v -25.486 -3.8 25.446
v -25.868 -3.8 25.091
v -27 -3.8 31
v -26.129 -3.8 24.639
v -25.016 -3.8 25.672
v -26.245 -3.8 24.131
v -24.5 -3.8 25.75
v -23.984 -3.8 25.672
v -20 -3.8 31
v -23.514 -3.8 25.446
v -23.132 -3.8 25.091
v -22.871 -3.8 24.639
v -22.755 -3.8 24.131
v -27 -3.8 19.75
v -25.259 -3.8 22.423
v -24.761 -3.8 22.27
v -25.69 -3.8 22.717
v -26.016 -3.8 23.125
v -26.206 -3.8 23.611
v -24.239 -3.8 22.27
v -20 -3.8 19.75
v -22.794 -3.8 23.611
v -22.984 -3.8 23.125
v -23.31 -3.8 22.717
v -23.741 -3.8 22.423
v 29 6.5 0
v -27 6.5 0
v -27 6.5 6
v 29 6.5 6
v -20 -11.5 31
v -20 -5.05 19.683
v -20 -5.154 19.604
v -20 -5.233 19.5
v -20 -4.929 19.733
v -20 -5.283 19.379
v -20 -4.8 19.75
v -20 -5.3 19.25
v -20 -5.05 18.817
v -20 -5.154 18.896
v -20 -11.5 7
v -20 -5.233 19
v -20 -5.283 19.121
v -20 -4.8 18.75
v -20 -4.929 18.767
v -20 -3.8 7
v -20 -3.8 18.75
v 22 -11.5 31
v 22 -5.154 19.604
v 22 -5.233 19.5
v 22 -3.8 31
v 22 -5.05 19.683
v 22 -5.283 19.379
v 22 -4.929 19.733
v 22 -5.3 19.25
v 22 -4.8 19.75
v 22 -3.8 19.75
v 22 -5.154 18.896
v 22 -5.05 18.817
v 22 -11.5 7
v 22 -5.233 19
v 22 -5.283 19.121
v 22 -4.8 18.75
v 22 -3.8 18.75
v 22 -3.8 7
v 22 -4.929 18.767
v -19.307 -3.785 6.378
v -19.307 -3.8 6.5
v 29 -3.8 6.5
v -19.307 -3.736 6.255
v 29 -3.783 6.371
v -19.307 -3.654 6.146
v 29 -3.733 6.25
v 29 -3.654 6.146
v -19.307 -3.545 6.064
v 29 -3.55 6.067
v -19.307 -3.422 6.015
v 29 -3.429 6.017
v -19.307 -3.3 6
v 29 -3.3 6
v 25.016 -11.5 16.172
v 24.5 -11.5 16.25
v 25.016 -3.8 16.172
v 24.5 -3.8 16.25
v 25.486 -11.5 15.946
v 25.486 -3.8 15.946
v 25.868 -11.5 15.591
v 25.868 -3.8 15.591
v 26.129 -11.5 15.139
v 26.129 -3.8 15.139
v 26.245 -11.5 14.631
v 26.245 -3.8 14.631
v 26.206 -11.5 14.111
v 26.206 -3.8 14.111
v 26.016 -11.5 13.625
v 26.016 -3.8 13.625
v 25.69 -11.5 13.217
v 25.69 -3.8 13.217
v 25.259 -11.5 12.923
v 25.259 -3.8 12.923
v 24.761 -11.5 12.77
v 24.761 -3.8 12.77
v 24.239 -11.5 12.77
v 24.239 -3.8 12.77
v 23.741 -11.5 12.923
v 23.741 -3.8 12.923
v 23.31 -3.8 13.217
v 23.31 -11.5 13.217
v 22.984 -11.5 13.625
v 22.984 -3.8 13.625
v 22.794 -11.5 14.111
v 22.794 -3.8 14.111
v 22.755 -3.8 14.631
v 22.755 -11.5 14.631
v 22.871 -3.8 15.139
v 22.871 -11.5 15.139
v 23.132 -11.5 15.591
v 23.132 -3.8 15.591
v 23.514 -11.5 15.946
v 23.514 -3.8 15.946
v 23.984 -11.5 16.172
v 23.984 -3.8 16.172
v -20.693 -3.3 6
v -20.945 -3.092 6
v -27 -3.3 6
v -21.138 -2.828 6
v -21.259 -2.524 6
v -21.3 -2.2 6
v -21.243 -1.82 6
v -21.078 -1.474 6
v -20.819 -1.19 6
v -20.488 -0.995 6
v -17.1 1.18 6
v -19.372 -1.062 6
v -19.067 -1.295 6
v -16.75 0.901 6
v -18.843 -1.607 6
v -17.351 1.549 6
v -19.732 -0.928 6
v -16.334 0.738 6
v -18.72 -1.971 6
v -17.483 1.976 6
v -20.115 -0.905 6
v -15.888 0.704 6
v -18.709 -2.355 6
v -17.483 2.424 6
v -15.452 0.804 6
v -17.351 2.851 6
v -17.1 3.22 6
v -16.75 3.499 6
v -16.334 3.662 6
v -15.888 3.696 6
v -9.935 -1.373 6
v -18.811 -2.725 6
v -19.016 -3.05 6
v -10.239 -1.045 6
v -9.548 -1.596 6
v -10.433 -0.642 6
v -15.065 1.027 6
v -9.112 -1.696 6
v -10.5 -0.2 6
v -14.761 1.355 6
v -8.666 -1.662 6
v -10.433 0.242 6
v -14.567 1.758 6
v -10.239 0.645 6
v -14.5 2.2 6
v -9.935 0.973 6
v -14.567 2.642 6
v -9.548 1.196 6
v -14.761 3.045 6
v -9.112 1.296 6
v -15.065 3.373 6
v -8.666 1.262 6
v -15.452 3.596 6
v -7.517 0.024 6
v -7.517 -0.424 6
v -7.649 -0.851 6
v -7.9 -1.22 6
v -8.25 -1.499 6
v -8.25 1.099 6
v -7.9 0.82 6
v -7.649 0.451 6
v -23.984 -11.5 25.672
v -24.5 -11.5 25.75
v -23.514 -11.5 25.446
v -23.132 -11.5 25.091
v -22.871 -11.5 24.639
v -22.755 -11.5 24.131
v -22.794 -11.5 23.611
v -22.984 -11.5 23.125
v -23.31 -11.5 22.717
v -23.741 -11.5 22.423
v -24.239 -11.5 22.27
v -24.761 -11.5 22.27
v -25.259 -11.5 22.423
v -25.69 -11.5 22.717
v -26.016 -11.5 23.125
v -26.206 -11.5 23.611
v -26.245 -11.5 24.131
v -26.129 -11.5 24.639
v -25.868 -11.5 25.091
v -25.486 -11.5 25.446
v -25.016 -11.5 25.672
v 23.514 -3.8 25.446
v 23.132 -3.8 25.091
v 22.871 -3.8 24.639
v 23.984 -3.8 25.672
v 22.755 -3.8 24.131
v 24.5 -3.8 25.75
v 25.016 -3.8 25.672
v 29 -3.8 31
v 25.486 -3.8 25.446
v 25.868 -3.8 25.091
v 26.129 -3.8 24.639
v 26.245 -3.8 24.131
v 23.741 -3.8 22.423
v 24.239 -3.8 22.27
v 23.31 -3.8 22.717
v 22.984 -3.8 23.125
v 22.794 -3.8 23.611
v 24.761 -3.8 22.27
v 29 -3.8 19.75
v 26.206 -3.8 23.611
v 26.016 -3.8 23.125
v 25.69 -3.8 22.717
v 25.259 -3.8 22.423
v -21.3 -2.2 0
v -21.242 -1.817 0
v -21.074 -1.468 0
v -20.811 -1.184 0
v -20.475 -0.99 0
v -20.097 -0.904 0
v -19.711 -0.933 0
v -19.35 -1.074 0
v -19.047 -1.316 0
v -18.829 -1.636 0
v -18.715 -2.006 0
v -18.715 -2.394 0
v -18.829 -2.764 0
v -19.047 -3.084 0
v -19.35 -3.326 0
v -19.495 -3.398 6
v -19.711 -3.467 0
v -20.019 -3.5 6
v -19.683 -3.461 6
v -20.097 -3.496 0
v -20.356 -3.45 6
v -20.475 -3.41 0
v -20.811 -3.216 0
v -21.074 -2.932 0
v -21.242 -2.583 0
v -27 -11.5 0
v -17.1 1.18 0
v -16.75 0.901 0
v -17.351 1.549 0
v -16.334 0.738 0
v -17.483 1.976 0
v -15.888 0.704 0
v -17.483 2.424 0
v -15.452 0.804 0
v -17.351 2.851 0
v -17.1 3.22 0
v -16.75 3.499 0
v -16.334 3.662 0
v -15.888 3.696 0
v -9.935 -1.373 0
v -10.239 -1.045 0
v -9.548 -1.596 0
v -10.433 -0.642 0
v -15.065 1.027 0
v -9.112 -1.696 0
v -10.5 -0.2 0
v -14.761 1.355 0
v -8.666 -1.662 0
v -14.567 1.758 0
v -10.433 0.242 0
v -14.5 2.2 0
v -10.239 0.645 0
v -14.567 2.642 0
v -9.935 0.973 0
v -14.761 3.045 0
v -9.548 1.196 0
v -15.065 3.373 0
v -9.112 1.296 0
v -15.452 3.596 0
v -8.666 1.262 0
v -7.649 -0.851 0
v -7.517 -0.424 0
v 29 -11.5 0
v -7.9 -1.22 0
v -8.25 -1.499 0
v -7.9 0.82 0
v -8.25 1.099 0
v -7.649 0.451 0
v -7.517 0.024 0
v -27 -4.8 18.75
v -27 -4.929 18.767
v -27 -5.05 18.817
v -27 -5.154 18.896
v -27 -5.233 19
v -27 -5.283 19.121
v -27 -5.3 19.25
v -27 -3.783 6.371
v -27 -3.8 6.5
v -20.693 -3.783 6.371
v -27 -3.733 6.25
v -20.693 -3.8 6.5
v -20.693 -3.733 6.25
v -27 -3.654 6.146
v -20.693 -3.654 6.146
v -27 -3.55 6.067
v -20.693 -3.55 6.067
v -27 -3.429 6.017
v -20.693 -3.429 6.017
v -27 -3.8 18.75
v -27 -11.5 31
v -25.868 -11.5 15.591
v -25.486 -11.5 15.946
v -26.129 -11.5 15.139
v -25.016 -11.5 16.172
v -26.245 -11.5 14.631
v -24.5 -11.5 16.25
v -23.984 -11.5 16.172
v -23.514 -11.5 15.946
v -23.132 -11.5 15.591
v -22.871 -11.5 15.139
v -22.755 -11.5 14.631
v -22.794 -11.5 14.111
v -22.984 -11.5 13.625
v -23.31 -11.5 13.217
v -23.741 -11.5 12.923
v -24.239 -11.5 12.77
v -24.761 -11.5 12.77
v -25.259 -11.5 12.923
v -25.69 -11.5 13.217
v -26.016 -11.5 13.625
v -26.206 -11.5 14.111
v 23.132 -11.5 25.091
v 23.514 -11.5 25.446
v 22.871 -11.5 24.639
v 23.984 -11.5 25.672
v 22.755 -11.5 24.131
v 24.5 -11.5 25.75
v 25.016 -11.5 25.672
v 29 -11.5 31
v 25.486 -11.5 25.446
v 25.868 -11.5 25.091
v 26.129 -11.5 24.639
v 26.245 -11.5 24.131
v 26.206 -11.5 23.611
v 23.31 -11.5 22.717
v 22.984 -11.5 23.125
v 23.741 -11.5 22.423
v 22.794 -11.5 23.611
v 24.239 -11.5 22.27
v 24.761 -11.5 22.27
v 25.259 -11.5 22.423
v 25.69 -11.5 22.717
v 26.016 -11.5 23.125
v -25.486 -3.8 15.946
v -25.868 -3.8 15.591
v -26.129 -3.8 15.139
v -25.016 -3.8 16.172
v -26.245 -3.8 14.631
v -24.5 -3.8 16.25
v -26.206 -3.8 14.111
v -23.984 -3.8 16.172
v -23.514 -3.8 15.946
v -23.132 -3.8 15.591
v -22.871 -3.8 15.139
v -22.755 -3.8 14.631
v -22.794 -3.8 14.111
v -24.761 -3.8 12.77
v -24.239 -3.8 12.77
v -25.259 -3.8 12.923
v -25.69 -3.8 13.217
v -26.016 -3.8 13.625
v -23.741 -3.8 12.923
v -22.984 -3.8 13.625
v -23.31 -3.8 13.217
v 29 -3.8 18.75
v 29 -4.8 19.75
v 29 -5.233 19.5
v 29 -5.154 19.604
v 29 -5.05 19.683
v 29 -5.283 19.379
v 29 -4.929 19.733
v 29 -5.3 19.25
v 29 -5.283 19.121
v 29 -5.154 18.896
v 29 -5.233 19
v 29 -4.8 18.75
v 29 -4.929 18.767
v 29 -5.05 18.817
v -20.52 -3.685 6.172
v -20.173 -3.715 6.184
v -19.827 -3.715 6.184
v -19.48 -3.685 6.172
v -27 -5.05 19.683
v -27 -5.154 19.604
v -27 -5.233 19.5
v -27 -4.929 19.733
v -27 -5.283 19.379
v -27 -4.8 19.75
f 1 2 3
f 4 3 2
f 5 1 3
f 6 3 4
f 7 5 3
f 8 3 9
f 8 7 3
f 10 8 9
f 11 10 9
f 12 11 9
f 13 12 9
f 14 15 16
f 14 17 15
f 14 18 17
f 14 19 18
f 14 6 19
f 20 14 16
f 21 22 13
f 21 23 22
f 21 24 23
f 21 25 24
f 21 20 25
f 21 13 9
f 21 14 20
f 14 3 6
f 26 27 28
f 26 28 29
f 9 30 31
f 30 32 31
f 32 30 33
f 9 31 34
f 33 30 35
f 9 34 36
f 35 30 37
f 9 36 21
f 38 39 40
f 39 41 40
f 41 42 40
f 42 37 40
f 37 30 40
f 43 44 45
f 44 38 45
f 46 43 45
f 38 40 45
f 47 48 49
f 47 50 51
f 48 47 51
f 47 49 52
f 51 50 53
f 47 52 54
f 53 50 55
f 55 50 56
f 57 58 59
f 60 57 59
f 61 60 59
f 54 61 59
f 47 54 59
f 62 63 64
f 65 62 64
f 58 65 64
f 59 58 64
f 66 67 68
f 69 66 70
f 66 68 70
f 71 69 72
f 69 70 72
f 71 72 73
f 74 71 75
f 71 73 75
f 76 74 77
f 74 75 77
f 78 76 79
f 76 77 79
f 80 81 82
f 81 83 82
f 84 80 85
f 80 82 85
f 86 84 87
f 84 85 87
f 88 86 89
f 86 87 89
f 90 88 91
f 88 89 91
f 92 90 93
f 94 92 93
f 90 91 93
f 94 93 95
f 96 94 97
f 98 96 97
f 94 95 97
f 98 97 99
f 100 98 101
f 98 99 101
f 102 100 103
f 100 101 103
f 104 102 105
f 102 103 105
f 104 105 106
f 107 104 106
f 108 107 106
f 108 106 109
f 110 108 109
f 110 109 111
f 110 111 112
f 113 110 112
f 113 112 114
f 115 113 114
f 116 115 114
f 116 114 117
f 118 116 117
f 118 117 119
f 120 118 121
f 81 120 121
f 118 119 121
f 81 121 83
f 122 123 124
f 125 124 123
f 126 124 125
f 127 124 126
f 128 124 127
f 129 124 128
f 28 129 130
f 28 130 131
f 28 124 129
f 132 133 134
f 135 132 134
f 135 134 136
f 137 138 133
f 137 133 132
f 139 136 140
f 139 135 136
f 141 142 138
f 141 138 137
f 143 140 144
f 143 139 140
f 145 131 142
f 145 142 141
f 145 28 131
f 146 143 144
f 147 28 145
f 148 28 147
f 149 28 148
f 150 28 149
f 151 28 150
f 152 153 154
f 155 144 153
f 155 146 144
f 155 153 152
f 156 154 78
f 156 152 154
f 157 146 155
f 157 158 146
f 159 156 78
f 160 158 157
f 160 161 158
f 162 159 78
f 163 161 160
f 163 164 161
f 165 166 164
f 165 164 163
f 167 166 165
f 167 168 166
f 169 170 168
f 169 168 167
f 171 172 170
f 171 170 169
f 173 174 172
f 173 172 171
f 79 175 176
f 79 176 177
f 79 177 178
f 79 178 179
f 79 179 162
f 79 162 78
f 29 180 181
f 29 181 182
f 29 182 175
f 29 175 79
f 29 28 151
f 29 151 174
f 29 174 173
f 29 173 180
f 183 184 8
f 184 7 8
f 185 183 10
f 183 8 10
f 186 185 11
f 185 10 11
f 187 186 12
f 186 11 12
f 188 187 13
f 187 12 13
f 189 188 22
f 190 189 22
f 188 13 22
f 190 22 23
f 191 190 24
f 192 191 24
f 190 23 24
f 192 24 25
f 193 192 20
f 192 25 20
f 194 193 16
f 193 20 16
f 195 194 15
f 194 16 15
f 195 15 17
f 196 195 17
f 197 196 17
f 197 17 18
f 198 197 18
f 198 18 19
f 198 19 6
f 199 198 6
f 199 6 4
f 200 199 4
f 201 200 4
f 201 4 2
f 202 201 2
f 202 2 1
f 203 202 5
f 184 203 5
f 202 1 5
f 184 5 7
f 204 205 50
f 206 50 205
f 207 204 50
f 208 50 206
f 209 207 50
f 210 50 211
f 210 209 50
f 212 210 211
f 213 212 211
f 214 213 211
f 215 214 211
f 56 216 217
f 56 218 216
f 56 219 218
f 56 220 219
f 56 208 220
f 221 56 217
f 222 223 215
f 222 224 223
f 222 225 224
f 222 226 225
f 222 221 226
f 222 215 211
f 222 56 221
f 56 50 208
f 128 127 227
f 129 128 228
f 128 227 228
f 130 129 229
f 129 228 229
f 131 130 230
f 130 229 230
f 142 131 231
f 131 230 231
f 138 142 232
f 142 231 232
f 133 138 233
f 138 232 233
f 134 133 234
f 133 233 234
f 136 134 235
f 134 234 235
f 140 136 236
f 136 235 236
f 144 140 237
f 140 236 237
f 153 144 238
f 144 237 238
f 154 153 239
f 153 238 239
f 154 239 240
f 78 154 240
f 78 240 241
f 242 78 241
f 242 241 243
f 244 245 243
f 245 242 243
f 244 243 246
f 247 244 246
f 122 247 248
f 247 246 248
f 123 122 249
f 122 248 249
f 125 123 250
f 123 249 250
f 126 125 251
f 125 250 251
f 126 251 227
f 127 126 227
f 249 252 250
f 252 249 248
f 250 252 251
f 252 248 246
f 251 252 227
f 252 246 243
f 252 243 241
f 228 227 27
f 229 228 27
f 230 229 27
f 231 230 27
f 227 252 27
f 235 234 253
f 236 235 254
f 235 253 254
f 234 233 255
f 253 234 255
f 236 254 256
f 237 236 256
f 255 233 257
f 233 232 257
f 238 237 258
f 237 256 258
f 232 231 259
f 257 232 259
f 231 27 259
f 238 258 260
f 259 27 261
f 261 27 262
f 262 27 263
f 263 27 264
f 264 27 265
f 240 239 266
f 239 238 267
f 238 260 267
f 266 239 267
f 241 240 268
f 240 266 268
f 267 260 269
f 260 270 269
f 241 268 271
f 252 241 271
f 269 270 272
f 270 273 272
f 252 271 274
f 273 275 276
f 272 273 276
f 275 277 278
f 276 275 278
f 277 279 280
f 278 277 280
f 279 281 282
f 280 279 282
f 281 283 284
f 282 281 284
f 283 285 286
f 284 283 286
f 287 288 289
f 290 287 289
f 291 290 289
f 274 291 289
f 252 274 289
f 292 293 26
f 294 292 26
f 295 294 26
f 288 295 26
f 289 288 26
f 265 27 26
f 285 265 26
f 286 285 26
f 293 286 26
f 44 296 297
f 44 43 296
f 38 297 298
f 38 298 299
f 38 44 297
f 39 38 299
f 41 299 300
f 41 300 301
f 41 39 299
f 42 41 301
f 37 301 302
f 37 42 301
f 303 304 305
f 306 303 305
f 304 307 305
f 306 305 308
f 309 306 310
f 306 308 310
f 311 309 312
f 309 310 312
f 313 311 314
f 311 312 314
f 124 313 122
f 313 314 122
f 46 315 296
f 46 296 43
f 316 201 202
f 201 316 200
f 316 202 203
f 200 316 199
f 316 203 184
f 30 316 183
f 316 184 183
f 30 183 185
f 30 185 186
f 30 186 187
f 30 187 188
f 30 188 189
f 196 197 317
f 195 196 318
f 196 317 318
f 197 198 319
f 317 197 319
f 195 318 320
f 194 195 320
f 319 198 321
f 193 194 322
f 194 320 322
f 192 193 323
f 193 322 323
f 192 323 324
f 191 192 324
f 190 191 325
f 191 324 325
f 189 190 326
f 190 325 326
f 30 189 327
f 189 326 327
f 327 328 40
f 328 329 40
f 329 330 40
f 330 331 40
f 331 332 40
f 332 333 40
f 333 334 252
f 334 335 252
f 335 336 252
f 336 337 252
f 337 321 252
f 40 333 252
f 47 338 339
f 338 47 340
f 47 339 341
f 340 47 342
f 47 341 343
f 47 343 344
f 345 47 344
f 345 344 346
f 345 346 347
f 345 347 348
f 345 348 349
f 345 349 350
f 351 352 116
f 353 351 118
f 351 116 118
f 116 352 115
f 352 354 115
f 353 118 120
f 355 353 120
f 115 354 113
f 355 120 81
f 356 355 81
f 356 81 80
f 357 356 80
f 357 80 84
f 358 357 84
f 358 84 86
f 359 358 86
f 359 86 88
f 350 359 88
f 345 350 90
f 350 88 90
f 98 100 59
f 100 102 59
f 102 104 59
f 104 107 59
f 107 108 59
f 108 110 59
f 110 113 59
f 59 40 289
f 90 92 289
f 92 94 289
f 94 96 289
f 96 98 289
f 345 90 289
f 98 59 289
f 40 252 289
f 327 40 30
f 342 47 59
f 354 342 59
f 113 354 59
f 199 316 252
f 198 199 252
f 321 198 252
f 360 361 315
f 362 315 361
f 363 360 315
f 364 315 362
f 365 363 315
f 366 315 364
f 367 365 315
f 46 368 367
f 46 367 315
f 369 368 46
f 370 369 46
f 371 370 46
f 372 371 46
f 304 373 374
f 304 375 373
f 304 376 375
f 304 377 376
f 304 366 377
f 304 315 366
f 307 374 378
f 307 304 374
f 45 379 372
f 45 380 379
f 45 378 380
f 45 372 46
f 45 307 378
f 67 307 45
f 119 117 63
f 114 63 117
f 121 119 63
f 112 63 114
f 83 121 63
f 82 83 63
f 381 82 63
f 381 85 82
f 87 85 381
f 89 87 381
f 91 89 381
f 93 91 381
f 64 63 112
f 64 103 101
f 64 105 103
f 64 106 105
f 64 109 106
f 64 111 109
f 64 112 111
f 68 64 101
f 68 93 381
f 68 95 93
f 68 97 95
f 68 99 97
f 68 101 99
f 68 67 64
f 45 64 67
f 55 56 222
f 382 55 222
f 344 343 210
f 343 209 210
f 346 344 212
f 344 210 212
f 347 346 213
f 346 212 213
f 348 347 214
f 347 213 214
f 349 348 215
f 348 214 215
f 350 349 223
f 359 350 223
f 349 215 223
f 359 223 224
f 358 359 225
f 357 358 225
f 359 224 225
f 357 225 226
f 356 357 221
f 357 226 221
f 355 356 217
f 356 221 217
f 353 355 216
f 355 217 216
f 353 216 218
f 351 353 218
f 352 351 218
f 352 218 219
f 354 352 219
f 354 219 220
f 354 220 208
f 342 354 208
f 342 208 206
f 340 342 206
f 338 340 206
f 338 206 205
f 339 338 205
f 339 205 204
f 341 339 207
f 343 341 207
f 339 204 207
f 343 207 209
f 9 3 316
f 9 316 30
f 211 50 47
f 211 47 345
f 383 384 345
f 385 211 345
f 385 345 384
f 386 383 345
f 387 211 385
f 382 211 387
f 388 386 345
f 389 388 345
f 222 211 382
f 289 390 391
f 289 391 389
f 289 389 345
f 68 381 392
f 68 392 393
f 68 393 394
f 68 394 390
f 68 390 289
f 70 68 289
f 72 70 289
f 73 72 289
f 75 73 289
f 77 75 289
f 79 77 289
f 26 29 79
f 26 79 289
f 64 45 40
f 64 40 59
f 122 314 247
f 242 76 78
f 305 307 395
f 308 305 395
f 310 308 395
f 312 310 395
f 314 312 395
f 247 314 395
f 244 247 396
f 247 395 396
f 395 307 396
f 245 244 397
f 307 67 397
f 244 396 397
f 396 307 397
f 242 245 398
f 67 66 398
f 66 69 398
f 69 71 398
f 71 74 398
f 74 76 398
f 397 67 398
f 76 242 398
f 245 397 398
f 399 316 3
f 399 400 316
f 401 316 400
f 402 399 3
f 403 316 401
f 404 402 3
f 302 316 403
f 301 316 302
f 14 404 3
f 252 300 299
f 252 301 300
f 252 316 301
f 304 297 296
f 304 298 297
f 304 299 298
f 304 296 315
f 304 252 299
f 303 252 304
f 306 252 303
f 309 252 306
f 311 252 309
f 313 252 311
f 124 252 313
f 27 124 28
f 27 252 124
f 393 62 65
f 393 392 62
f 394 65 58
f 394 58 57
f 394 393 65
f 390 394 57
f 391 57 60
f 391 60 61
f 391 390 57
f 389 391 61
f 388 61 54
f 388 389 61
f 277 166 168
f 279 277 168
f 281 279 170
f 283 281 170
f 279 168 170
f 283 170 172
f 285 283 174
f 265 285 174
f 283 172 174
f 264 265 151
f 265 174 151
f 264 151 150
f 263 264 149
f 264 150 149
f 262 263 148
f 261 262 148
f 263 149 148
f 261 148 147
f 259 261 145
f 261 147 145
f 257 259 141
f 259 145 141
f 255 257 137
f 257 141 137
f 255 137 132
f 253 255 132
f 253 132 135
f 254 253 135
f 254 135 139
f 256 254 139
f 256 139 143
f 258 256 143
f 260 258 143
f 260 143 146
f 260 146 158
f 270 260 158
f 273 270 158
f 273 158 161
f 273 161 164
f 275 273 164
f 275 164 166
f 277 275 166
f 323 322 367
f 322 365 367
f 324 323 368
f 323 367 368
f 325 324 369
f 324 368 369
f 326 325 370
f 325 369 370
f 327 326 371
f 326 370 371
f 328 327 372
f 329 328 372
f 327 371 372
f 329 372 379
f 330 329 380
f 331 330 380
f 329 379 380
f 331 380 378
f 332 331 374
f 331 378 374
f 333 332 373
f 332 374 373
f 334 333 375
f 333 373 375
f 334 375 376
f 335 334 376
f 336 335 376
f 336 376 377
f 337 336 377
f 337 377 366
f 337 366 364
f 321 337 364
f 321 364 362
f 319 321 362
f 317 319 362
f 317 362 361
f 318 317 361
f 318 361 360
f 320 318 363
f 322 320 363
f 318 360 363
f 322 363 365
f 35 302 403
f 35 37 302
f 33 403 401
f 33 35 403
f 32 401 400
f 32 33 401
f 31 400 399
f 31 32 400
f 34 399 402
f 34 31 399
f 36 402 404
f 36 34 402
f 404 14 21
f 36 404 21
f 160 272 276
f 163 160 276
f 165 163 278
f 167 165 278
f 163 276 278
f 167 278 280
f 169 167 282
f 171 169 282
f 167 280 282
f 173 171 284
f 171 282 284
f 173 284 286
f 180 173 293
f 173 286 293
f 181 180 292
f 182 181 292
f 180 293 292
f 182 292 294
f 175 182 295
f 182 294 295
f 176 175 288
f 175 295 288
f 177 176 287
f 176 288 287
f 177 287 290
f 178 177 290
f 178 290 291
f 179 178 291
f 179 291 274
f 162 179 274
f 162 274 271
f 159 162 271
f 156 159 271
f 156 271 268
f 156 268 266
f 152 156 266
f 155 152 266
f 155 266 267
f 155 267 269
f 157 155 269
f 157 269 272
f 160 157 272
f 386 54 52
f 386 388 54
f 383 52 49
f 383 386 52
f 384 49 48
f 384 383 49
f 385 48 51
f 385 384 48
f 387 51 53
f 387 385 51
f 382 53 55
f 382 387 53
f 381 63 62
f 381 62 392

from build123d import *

# Parameters (mm, degrees)
SKETCH_1_W           = 58
SKETCH_1_H           = 13
EXTRUDE_1_DEPTH      = 6
SKETCH_9_W           = 58
SKETCH_9_H           = 2.7
EXTRUDE_5_DEPTH      = 22
SKETCH_10_R          = 1.75
CUT_EXTRUDE_6_DEPTH  = 42.606369705
SKETCH_11_W          = 40
SKETCH_11_H          = 20
CUT_EXTRUDE_7_DEPTH  = 42.606369705
SKETCH_13_W          = 2
SKETCH_13_H          = 13
CUT_EXTRUDE_8_DEPTH  = 41.831972766
SKETCH_3_R           = 1.3
SKETCH_3_R_2         = 1.5
CUT_EXTRUDE_9_DEPTH  = 10
SKETCH_14_W          = 40
SKETCH_14_H          = 20
EXTRUDE_6_DEPTH      = 5
SKETCH_15_R          = 1.75
CUT_EXTRUDE_10_DEPTH = 42.606369705
SKETCH_16_W          = 40
SKETCH_16_H          = 1
CUT_EXTRUDE_11_DEPTH = 10
SKETCH_17_W          = 2
SKETCH_17_H          = 21
CUT_EXTRUDE_13_DEPTH = 10
SKETCH_18_W          = 7
SKETCH_18_H          = 1
CUT_EXTRUDE_14_DEPTH = 1.5
FILLET_1_R           = 0.5
SKETCH_21_R          = 1.5
CUT_EXTRUDE_16_DEPTH = 10
FILLET_4_R           = 0.5
SKETCH_23_W          = 7
SKETCH_23_H          = 7.7
EXTRUDE_7_DEPTH      = 3


with BuildPart() as part:
    # 草图1 → 凸台-拉伸1 (new body)
    with BuildSketch(Plane.XY):
        Rectangle(SKETCH_1_W, SKETCH_1_H)
    extrude(amount=EXTRUDE_1_DEPTH)

    # 草图9 → 凸台-拉伸5 (add)
    with BuildSketch(Plane.XY.offset(6)):
        with Locations((0, -5.15)):
            Rectangle(SKETCH_9_W, SKETCH_9_H)
    extrude(amount=EXTRUDE_5_DEPTH)

    # 草图10 → 切除-拉伸6 (cut, through all)
    with BuildSketch(Plane(origin=(0, -3.8, 0), x_dir=(1, 0, 0), z_dir=(0, 1, 0))):
        with Locations(Location((-24.5, -24, 0), (0, 0, 270))):
            Circle(SKETCH_10_R)
        with Locations(Location((-24.5, -14.5, 0), (0, 0, 270))):
            Circle(SKETCH_10_R)
        with Locations(Location((24.5, -24, 0), (0, 0, 270))):
            Circle(SKETCH_10_R)
        with Locations(Location((24.5, -14.5, 0), (0, 0, 270))):
            Circle(SKETCH_10_R)
    extrude(amount=-CUT_EXTRUDE_6_DEPTH, mode=Mode.SUBTRACT)

    # 草图11 → 切除-拉伸7 (cut, through all)
    with BuildSketch(Plane(origin=(0, -3.8, 0), x_dir=(1, 0, 0), z_dir=(0, 1, 0))):
        with Locations((0, -17)):
            Rectangle(SKETCH_11_W, SKETCH_11_H)
    extrude(amount=-CUT_EXTRUDE_7_DEPTH, mode=Mode.SUBTRACT)

    # 草图13 → 切除-拉伸8 (cut, through all)
    with BuildSketch(Plane.XY.offset(28)):
        with Locations((-28, 0)):
            Rectangle(SKETCH_13_W, SKETCH_13_H)
    extrude(amount=-CUT_EXTRUDE_8_DEPTH, mode=Mode.SUBTRACT)

    # 草图3 → 切除-拉伸9 (cut)
    with BuildSketch(Plane(origin=(0, 0, 0), x_dir=(-1, 0, 0), z_dir=(0, 0, -1))):
        with Locations((20, -2.2)):
            Circle(SKETCH_3_R)
        with Locations((9, -0.2)):
            Circle(SKETCH_3_R_2)
    extrude(amount=-CUT_EXTRUDE_9_DEPTH, mode=Mode.SUBTRACT)

    # 草图14 → 凸台-拉伸6 (add)
    with BuildSketch(Plane.XZ.offset(6.5)):
        Polygon((-27, 28), (-20, 28), (20, 28), (29, 28), (29, 0), (-20, 0), (-27, 0), align=None)
        with Locations((0, 17)):
            Rectangle(SKETCH_14_W, SKETCH_14_H, mode=Mode.SUBTRACT)
    extrude(amount=EXTRUDE_6_DEPTH)

    # 草图15 → 切除-拉伸10 (cut, through all)
    with BuildSketch(Plane(origin=(0, -3.8, 0), x_dir=(1, 0, 0), z_dir=(0, 1, 0))):
        with Locations(Location((-24.5, -14.5, 0), (0, 0, 270))):
            Circle(SKETCH_15_R)
        with Locations(Location((-24.5, -24, 0), (0, 0, 270))):
            Circle(SKETCH_15_R)
        with Locations(Location((24.5, -14.5, 0), (0, 0, 270))):
            Circle(SKETCH_15_R)
        with Locations(Location((24.5, -24, 0), (0, 0, 270))):
            Circle(SKETCH_15_R)
    extrude(amount=-CUT_EXTRUDE_10_DEPTH, mode=Mode.SUBTRACT)

    # 草图16 → 切除-拉伸11 (cut)
    with BuildSketch(Plane(origin=(0, -3.8, 0), x_dir=(1, 0, 0), z_dir=(0, 1, 0))):
        with Locations((0, -27.5)):
            Rectangle(SKETCH_16_W, SKETCH_16_H)
    extrude(amount=-CUT_EXTRUDE_11_DEPTH, mode=Mode.SUBTRACT)

    # 草图17 → 切除-拉伸13 (cut)
    with BuildSketch(Plane(origin=(0, -3.8, 0), x_dir=(1, 0, 0), z_dir=(0, 1, 0))):
        with Locations((21, -17.5)):
            Rectangle(SKETCH_17_W, SKETCH_17_H)
    extrude(amount=-CUT_EXTRUDE_13_DEPTH, mode=Mode.SUBTRACT)

    # 草图18 → 切除-拉伸14 (cut)
    with BuildSketch(Plane(origin=(0, -3.8, 0), x_dir=(1, 0, 0), z_dir=(0, 1, 0))):
        with Locations((-23.5, -19.25)):
            Rectangle(SKETCH_18_W, SKETCH_18_H)
        with Locations((25.5, -19.25)):
            Rectangle(SKETCH_18_W, SKETCH_18_H)
    extrude(amount=-CUT_EXTRUDE_14_DEPTH, mode=Mode.SUBTRACT)

    # 圆角1
    fillet_1_edges = [part.edges().sort_by_distance(p)[0] for p in [
        (1, -3.8, 6),
    ]]
    fillet(fillet_1_edges, radius=FILLET_1_R)

    # 草图21 → 切除-拉伸16 (cut)
    with BuildSketch(Plane.XY.offset(6)):
        with Locations((-16, 2.2)):
            Circle(SKETCH_21_R)
    extrude(amount=-CUT_EXTRUDE_16_DEPTH, mode=Mode.SUBTRACT)

    # 圆角4
    fillet_4_edges = [part.edges().sort_by_distance(p)[0] for p in [
        (25.5, -5.3, 19.75),
        (25.5, -5.3, 18.75),
        (-23.5, -5.3, 19.75),
        (-23.5, -5.3, 18.75),
    ]]
    fillet(fillet_4_edges, radius=FILLET_4_R - 0.0001)  # a hair under: the kernel refuses the full size

    # 草图23 → 凸台-拉伸7 (add)
    with BuildSketch(Plane.XY.offset(28)):
        with Locations((-23.5, -7.65)):
            Rectangle(SKETCH_23_W, SKETCH_23_H)
        with Locations((25.5, -7.65)):
            Rectangle(SKETCH_23_W, SKETCH_23_H)
    extrude(amount=EXTRUDE_7_DEPTH)


solid = part.part
